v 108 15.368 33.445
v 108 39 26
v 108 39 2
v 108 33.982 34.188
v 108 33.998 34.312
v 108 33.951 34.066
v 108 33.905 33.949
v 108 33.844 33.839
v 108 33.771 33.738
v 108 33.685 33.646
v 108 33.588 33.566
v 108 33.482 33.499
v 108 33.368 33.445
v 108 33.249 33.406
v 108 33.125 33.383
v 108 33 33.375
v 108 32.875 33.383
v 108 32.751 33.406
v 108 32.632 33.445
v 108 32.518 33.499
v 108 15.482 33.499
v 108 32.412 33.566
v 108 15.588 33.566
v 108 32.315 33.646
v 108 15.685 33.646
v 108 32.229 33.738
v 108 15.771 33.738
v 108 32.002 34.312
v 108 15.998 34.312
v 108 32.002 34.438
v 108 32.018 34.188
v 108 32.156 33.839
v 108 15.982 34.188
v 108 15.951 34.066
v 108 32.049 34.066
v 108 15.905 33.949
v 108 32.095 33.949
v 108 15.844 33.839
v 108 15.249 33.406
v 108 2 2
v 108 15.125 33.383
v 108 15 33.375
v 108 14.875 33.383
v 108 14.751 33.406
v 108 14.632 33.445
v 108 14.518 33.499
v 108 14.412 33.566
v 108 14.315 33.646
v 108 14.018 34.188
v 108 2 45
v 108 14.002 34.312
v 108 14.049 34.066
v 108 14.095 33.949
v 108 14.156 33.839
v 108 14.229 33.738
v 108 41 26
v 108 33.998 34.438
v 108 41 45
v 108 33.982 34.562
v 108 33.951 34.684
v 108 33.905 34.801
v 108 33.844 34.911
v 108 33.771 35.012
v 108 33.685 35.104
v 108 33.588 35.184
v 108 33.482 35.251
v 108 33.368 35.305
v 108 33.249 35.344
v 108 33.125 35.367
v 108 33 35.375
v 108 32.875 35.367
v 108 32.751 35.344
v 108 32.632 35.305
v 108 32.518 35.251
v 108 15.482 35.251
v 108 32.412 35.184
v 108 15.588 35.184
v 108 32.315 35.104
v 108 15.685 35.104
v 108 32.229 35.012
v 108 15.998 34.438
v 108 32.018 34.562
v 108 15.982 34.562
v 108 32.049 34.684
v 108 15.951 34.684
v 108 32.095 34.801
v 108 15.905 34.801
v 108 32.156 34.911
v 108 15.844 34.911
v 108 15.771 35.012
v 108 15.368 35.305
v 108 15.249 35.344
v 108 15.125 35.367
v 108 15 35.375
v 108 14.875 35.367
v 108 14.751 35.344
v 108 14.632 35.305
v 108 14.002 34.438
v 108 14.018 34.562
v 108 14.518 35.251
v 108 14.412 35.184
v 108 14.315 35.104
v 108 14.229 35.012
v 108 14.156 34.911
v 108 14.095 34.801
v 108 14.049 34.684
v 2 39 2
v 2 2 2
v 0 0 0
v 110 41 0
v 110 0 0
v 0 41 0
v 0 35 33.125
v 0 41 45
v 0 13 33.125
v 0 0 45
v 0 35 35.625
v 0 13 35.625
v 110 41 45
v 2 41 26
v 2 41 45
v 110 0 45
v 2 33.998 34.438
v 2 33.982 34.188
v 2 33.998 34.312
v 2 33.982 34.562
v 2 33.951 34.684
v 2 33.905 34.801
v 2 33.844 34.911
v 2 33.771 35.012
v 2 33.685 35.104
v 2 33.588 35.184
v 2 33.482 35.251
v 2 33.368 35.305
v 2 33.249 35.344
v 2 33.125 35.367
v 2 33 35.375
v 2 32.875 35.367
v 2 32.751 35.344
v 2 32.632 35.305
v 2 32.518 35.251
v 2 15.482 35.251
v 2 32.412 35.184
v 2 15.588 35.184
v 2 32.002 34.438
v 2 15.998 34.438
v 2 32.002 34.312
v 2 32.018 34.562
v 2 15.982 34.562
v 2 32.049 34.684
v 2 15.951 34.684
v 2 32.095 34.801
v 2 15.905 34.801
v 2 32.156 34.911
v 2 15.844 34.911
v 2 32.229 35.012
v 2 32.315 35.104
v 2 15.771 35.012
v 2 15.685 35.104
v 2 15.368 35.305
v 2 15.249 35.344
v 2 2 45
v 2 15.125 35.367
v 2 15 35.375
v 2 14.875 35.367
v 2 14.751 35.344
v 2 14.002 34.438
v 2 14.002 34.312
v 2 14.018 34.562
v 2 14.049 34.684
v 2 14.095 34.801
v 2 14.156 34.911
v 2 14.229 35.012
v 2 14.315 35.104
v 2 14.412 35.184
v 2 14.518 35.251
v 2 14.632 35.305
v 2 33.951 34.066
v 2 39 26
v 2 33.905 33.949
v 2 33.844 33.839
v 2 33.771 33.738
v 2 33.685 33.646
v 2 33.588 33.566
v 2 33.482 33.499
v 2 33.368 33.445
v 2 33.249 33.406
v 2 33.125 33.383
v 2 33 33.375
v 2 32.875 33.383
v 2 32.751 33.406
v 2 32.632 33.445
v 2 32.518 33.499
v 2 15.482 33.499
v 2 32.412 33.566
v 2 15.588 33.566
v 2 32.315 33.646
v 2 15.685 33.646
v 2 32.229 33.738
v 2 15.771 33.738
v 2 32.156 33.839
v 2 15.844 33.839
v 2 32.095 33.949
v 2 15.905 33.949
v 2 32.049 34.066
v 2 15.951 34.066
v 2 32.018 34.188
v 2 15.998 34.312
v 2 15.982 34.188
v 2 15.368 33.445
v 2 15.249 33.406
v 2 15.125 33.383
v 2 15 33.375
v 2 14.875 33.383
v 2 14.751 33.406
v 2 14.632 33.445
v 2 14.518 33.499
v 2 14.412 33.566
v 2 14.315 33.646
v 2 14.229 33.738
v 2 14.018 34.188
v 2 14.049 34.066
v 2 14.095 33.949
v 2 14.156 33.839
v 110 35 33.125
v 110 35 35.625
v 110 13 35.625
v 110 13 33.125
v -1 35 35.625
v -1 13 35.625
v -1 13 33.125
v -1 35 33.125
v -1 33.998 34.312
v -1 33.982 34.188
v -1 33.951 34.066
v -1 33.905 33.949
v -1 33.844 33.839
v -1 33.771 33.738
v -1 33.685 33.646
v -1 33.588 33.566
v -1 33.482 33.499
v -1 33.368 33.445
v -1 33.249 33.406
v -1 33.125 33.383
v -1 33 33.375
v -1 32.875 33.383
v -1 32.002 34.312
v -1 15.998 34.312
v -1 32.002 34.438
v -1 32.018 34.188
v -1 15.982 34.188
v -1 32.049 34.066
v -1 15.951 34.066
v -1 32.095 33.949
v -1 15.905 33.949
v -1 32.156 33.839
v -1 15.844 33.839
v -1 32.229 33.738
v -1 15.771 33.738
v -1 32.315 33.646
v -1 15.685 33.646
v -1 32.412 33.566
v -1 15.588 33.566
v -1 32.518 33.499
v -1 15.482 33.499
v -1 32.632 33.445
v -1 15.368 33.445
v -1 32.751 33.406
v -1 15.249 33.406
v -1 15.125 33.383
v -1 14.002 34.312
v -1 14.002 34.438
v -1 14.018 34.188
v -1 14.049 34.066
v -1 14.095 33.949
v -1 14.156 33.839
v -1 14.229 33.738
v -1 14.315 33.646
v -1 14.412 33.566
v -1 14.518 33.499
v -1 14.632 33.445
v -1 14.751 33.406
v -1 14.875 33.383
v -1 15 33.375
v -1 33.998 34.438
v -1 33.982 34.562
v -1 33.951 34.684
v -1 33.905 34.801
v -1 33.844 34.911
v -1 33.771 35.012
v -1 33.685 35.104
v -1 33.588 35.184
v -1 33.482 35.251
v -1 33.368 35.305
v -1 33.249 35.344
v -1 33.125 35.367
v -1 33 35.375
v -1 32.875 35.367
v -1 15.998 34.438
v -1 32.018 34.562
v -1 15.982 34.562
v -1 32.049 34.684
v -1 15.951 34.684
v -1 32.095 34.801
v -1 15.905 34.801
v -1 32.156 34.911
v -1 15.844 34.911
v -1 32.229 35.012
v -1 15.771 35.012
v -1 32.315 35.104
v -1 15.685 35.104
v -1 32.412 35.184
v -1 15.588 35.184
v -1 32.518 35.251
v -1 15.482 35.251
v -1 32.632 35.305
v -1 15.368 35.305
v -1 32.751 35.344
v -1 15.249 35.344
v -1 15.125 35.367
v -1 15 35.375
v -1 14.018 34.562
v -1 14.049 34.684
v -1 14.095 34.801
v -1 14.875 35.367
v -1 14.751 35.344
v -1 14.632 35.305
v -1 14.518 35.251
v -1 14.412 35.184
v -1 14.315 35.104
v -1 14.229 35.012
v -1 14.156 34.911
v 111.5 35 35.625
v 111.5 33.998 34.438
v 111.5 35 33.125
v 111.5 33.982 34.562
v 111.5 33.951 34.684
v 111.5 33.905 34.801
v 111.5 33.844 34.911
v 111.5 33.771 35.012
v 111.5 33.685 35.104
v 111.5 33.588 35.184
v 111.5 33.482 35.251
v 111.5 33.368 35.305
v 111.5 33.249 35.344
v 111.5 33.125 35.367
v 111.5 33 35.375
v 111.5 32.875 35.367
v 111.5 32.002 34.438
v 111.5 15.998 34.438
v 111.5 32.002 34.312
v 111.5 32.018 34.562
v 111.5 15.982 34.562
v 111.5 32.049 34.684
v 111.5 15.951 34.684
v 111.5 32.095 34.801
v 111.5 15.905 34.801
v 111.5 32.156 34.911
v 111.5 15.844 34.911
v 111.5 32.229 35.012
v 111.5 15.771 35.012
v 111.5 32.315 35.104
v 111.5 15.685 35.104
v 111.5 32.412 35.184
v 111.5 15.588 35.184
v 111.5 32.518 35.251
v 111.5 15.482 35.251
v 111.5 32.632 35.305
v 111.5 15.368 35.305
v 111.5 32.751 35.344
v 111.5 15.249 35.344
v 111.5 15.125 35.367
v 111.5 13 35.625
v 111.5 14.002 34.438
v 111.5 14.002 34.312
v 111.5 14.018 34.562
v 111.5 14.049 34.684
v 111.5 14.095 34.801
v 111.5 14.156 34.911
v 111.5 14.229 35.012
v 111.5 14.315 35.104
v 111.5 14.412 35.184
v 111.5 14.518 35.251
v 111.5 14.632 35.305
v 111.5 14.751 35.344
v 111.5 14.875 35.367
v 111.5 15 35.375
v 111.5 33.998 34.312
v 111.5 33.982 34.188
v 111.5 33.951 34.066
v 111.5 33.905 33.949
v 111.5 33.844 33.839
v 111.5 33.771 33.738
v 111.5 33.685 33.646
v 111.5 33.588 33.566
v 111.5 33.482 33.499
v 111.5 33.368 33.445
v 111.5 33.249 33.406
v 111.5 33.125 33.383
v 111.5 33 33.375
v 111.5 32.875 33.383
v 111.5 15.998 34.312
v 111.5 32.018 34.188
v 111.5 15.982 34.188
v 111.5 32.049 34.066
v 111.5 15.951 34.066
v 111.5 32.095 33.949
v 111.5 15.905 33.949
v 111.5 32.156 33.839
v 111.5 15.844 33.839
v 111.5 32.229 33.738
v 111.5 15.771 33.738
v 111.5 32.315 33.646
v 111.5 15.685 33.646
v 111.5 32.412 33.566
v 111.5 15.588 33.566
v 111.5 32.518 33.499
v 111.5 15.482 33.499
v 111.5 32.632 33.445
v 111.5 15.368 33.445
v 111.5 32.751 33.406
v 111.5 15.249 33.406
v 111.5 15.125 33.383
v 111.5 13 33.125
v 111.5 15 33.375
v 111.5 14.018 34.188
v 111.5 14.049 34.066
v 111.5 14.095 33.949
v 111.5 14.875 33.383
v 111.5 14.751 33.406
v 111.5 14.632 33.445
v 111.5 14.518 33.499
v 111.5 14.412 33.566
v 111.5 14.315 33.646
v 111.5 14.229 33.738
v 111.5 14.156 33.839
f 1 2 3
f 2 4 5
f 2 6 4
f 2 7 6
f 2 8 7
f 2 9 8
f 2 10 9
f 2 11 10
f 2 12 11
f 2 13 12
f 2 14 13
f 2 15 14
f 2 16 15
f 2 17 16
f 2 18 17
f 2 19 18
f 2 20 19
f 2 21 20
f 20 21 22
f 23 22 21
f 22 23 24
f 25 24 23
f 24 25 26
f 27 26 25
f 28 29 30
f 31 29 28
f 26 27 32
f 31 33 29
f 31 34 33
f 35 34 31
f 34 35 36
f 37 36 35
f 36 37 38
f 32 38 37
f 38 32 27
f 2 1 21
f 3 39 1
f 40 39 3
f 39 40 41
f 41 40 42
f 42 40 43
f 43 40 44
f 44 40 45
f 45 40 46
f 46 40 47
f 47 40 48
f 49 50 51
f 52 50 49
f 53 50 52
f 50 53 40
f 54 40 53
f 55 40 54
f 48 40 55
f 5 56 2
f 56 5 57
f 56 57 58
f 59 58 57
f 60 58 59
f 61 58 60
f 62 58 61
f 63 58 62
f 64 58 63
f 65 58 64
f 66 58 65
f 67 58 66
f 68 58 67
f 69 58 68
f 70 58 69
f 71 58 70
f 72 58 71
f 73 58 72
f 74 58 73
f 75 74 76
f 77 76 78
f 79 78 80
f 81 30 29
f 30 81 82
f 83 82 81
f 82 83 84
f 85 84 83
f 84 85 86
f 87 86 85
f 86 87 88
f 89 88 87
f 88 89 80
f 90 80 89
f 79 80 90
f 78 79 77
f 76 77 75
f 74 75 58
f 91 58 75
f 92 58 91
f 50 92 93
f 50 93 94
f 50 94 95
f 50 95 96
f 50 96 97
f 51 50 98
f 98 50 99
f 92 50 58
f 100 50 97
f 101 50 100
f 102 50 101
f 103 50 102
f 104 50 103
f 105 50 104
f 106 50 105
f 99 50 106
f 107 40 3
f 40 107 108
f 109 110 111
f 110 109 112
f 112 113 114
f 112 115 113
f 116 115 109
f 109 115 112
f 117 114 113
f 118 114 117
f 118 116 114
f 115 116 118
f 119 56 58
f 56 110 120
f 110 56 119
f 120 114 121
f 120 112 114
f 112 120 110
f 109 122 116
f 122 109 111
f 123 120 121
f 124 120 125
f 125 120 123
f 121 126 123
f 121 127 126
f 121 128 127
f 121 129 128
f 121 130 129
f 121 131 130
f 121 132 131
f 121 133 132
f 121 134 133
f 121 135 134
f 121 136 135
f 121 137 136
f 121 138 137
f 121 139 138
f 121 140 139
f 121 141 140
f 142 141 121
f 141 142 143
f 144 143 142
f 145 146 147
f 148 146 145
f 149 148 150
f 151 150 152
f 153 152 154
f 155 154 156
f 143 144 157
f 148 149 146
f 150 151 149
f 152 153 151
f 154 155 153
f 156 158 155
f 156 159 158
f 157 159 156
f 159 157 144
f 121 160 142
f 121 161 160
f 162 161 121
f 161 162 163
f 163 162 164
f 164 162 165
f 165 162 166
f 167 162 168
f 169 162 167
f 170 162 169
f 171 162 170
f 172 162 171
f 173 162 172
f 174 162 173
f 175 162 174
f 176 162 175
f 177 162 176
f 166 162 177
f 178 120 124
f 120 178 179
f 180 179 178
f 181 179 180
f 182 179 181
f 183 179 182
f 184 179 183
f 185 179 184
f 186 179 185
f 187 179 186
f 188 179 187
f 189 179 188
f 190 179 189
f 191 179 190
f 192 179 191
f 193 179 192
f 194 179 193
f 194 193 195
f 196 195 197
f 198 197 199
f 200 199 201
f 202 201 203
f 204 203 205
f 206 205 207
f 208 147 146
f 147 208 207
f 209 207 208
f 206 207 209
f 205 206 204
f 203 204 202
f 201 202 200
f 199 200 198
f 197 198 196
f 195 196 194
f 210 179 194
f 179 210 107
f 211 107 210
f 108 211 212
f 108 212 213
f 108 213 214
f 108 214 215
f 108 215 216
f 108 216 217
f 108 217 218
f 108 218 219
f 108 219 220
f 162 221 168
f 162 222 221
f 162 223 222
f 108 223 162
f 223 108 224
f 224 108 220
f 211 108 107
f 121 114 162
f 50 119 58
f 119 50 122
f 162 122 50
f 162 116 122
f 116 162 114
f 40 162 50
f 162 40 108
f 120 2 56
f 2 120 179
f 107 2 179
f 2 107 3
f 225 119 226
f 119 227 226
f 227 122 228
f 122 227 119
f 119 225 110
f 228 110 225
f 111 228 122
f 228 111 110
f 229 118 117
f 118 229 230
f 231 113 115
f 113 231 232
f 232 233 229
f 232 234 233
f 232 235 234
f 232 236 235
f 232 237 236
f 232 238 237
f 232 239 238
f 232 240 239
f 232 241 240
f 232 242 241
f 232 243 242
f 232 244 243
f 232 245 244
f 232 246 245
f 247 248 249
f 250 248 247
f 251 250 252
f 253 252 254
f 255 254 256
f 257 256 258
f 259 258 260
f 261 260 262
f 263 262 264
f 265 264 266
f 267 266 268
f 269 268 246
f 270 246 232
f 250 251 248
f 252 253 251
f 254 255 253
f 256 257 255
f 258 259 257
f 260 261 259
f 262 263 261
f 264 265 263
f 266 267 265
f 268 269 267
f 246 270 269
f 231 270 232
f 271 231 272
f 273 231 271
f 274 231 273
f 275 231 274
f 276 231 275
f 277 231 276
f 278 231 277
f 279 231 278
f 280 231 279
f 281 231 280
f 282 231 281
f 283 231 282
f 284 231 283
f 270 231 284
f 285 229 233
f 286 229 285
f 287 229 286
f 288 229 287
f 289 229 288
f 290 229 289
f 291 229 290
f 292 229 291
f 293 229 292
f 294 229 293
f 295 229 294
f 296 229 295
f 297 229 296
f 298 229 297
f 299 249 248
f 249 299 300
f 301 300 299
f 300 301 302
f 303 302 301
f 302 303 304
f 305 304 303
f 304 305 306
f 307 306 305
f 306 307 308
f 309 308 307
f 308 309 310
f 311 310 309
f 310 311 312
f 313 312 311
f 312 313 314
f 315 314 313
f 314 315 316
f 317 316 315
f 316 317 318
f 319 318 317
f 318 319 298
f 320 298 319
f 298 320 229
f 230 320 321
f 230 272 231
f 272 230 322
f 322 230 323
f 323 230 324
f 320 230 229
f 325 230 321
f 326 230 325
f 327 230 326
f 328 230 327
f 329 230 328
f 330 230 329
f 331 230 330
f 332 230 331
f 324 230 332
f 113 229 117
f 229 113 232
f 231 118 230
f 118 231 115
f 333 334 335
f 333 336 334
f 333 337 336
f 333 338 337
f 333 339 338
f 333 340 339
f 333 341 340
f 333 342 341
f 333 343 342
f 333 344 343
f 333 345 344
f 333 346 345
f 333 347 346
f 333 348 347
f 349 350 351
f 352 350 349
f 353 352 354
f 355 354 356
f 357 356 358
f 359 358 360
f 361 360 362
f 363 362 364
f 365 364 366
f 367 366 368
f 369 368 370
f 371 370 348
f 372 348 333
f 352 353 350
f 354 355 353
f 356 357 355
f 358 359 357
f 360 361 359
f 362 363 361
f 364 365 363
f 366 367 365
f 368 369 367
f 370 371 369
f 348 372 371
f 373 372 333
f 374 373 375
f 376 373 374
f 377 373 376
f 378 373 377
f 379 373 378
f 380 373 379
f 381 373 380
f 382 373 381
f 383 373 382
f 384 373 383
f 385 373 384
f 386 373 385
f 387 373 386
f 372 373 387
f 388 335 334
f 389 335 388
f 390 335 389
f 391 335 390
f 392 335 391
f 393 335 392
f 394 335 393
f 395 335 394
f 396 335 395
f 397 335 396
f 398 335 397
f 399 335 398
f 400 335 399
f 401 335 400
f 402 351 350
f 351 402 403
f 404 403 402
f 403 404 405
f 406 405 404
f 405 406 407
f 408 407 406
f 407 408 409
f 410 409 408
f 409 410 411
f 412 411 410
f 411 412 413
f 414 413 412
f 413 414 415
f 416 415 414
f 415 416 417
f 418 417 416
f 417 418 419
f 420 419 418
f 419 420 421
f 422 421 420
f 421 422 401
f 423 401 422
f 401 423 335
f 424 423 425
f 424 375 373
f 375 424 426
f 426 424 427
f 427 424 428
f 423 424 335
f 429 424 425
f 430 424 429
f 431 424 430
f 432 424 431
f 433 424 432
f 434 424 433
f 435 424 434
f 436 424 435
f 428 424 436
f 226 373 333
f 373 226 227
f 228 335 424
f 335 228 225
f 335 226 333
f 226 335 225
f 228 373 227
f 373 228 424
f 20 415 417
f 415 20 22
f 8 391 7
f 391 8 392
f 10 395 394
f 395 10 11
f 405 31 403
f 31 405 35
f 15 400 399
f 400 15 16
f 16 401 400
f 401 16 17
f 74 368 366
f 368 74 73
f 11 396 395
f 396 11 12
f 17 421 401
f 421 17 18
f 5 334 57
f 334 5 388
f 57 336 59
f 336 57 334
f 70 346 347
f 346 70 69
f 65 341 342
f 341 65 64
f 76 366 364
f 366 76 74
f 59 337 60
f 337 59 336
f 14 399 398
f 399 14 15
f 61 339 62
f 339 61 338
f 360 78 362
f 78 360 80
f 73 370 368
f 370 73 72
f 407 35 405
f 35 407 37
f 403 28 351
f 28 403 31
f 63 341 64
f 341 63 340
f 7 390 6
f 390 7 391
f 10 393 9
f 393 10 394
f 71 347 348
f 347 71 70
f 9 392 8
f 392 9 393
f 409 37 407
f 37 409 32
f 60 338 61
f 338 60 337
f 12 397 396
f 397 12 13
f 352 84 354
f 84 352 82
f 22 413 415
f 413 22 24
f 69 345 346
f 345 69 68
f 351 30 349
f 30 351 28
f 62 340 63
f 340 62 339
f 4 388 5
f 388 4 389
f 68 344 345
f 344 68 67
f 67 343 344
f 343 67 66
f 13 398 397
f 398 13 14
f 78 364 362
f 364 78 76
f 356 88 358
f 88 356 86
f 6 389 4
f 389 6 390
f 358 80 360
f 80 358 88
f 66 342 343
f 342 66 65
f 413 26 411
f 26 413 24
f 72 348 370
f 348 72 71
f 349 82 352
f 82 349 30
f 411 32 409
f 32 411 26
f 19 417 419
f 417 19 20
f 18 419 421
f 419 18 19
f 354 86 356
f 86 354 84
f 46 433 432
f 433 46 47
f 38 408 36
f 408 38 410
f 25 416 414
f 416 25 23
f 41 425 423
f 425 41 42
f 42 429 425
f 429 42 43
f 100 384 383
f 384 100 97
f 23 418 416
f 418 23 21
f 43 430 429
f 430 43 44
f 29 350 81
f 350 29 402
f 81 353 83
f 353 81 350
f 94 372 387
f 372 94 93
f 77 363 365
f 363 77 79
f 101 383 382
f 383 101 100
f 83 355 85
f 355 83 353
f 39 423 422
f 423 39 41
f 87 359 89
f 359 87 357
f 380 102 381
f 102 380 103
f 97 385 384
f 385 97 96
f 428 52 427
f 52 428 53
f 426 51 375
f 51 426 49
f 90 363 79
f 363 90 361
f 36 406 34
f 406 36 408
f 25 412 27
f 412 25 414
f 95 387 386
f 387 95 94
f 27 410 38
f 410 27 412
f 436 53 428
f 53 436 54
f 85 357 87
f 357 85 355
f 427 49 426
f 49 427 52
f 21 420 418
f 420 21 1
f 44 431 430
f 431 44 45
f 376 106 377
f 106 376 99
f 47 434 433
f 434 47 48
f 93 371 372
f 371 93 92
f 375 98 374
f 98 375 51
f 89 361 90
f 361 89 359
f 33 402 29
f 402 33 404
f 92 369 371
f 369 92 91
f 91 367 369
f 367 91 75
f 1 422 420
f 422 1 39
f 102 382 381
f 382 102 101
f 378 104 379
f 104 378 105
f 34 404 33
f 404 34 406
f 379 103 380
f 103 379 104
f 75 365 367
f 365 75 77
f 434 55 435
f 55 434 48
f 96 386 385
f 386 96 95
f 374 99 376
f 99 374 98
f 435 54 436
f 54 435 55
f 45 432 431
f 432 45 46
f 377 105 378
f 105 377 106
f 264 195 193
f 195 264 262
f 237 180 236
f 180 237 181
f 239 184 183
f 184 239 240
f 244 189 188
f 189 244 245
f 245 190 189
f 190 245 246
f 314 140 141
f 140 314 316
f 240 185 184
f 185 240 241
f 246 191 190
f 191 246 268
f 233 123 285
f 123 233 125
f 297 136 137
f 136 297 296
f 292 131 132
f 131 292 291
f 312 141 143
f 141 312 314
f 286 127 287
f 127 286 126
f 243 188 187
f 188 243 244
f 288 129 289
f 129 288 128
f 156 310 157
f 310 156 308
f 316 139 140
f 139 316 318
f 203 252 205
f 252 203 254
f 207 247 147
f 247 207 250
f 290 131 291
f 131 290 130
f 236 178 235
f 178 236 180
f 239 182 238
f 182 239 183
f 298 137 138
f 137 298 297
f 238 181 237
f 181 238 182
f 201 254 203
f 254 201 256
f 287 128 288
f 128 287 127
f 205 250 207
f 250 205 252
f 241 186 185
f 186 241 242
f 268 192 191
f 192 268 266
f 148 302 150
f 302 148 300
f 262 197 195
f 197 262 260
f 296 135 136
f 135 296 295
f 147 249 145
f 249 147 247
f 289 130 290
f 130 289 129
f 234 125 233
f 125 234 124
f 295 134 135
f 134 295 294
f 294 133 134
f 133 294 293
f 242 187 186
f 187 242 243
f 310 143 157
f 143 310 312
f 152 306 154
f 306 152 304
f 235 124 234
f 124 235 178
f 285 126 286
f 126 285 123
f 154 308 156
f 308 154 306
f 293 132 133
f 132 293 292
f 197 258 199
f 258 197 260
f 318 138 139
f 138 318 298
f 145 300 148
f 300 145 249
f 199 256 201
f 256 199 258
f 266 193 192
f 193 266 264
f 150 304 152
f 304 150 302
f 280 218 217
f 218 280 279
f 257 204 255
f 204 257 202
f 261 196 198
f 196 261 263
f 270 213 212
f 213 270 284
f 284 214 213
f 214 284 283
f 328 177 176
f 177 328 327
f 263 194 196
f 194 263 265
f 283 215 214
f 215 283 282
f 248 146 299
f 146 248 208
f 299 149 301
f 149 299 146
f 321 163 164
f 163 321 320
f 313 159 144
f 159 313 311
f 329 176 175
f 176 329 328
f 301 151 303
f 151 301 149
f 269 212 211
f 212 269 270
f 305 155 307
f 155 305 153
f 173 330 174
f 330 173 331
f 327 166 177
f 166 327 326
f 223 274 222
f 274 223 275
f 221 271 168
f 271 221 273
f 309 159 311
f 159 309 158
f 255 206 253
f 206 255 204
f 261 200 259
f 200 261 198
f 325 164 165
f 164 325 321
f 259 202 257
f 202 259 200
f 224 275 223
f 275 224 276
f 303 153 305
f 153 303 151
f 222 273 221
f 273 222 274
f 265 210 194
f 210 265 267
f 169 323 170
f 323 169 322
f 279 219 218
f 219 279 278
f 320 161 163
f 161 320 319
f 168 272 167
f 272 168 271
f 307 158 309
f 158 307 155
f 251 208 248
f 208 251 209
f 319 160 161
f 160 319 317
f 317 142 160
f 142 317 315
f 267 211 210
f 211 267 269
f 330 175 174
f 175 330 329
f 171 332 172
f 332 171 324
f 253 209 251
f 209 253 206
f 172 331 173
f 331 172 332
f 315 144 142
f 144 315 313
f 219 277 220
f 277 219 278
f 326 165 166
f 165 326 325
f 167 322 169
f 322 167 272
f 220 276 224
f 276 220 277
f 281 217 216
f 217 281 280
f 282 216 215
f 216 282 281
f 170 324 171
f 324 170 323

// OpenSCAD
/*************************************************************************************************
Power Supply Terminal Cover for the power supply commonly used with the Bukobot and other 3d printers
Author: Mike Thompson (thingiverse: mike_linus)
Date Last Modified: 11/03/2013 4:19pm
Description: simply change the cutout parameters to suit. Note: do not change length, height, depth and thickness parameters for the base unless you want to change the core dimensions.
**************************************************************************************************/

//***************************************************************
//don't change these base parameters unless you want to change the core dimensions.
//***************************************************************
hole_resolution=50;
base_length=108;
base_height=41;
base_depth=45;//dec
bottom_height = base_depth-19;
base_thickness=2;
slot_depth = 9;// distance from well back to the closer slot edge
slot_len = 22;// slot length not counting radius
slot_width = 2.75; // slot_width
slot_height = 6; //distance from folded over inner ps bottom (usually a folded over lip) to nearest slot end
retainer_width = 2.5; //width of the retainer (a bit less than the slot)

slot_cen = base_depth-slot_width/2-slot_depth-0.25;
$fn=hole_resolution;

//***************************************************************
//change these cutout parameters to suit you own switch size etc.
//***************************************************************
switch_cutout_length=27;
switch_cutout_width=12;

led_cutout_radius=4;
grommet_cutout_radius=6;

power_plug_cutout_length=28;
power_plug_cutout_width=20;

screw_hole_cutout_radius=1;

module base(){
cube([base_length,base_height,base_thickness]);
cube([base_thickness,base_height,base_depth]);
cube([base_length,base_thickness,base_depth]);
 if(bottom_height>0) translate ([0,base_height-base_thickness,0]) cube ([base_length,base_thickness,bottom_height]);//dec
translate([base_length,0,0])cube([base_thickness,base_height,base_depth]);
translate([-1,base_height-slot_len-slot_height,slot_cen-retainer_width/2])cube([1.5,slot_len,retainer_width]);//slot retainer //dec
translate([base_length+base_thickness,base_height-slot_len-slot_height,slot_cen-retainer_width/2])cube([1.5,slot_len,retainer_width]);//slot retainer  //dec
}

difference(){
base();
//translate([72,0,3])cube([switch_cutout_length,base_thickness,switch_cutout_width]);  //switch cutout //dec
//translate([8,3,9])rotate([90,0,0])cylinder(r=led_cutout_radius,h=5);  //led cutout//dec
//translate([60,20,0])cylinder(r=grommet_cutout_radius,h=5);  //12v lead cutout//dec
//translate([14,3,0])cube([power_plug_cutout_length,power_plug_cutout_width,base_thickness]);  //240v plug cutout//dec
//translate([7.5,12.75,0])cylinder(r=screw_hole_cutout_radius,h=5);  //240v plug screw hole//dec
//translate([48,12.75,0])cylinder(r=screw_hole_cutout_radius,h=5);  //240v plug screw hole//dec
translate([base_length,base_height-slot_height-2,slot_cen])rotate([0,90,0])cylinder(r=screw_hole_cutout_radius,h=5);  //retainer screw hole //dec
#translate([base_length,base_height-slot_len-slot_height+2,slot_cen])rotate([0,90,0])cylinder(r=screw_hole_cutout_radius,h=5);  //retainer screw hole //dec
translate([-1,base_height-slot_height-2,slot_cen])rotate([0,90,0])cylinder(r=screw_hole_cutout_radius,h=5);  //retainer screw hole //dec
translate([-1,base_height-slot_len-slot_height+2,slot_cen])rotate([0,90,0])cylinder(r=screw_hole_cutout_radius,h=5);  //retainer screw hole//d\ec
}
